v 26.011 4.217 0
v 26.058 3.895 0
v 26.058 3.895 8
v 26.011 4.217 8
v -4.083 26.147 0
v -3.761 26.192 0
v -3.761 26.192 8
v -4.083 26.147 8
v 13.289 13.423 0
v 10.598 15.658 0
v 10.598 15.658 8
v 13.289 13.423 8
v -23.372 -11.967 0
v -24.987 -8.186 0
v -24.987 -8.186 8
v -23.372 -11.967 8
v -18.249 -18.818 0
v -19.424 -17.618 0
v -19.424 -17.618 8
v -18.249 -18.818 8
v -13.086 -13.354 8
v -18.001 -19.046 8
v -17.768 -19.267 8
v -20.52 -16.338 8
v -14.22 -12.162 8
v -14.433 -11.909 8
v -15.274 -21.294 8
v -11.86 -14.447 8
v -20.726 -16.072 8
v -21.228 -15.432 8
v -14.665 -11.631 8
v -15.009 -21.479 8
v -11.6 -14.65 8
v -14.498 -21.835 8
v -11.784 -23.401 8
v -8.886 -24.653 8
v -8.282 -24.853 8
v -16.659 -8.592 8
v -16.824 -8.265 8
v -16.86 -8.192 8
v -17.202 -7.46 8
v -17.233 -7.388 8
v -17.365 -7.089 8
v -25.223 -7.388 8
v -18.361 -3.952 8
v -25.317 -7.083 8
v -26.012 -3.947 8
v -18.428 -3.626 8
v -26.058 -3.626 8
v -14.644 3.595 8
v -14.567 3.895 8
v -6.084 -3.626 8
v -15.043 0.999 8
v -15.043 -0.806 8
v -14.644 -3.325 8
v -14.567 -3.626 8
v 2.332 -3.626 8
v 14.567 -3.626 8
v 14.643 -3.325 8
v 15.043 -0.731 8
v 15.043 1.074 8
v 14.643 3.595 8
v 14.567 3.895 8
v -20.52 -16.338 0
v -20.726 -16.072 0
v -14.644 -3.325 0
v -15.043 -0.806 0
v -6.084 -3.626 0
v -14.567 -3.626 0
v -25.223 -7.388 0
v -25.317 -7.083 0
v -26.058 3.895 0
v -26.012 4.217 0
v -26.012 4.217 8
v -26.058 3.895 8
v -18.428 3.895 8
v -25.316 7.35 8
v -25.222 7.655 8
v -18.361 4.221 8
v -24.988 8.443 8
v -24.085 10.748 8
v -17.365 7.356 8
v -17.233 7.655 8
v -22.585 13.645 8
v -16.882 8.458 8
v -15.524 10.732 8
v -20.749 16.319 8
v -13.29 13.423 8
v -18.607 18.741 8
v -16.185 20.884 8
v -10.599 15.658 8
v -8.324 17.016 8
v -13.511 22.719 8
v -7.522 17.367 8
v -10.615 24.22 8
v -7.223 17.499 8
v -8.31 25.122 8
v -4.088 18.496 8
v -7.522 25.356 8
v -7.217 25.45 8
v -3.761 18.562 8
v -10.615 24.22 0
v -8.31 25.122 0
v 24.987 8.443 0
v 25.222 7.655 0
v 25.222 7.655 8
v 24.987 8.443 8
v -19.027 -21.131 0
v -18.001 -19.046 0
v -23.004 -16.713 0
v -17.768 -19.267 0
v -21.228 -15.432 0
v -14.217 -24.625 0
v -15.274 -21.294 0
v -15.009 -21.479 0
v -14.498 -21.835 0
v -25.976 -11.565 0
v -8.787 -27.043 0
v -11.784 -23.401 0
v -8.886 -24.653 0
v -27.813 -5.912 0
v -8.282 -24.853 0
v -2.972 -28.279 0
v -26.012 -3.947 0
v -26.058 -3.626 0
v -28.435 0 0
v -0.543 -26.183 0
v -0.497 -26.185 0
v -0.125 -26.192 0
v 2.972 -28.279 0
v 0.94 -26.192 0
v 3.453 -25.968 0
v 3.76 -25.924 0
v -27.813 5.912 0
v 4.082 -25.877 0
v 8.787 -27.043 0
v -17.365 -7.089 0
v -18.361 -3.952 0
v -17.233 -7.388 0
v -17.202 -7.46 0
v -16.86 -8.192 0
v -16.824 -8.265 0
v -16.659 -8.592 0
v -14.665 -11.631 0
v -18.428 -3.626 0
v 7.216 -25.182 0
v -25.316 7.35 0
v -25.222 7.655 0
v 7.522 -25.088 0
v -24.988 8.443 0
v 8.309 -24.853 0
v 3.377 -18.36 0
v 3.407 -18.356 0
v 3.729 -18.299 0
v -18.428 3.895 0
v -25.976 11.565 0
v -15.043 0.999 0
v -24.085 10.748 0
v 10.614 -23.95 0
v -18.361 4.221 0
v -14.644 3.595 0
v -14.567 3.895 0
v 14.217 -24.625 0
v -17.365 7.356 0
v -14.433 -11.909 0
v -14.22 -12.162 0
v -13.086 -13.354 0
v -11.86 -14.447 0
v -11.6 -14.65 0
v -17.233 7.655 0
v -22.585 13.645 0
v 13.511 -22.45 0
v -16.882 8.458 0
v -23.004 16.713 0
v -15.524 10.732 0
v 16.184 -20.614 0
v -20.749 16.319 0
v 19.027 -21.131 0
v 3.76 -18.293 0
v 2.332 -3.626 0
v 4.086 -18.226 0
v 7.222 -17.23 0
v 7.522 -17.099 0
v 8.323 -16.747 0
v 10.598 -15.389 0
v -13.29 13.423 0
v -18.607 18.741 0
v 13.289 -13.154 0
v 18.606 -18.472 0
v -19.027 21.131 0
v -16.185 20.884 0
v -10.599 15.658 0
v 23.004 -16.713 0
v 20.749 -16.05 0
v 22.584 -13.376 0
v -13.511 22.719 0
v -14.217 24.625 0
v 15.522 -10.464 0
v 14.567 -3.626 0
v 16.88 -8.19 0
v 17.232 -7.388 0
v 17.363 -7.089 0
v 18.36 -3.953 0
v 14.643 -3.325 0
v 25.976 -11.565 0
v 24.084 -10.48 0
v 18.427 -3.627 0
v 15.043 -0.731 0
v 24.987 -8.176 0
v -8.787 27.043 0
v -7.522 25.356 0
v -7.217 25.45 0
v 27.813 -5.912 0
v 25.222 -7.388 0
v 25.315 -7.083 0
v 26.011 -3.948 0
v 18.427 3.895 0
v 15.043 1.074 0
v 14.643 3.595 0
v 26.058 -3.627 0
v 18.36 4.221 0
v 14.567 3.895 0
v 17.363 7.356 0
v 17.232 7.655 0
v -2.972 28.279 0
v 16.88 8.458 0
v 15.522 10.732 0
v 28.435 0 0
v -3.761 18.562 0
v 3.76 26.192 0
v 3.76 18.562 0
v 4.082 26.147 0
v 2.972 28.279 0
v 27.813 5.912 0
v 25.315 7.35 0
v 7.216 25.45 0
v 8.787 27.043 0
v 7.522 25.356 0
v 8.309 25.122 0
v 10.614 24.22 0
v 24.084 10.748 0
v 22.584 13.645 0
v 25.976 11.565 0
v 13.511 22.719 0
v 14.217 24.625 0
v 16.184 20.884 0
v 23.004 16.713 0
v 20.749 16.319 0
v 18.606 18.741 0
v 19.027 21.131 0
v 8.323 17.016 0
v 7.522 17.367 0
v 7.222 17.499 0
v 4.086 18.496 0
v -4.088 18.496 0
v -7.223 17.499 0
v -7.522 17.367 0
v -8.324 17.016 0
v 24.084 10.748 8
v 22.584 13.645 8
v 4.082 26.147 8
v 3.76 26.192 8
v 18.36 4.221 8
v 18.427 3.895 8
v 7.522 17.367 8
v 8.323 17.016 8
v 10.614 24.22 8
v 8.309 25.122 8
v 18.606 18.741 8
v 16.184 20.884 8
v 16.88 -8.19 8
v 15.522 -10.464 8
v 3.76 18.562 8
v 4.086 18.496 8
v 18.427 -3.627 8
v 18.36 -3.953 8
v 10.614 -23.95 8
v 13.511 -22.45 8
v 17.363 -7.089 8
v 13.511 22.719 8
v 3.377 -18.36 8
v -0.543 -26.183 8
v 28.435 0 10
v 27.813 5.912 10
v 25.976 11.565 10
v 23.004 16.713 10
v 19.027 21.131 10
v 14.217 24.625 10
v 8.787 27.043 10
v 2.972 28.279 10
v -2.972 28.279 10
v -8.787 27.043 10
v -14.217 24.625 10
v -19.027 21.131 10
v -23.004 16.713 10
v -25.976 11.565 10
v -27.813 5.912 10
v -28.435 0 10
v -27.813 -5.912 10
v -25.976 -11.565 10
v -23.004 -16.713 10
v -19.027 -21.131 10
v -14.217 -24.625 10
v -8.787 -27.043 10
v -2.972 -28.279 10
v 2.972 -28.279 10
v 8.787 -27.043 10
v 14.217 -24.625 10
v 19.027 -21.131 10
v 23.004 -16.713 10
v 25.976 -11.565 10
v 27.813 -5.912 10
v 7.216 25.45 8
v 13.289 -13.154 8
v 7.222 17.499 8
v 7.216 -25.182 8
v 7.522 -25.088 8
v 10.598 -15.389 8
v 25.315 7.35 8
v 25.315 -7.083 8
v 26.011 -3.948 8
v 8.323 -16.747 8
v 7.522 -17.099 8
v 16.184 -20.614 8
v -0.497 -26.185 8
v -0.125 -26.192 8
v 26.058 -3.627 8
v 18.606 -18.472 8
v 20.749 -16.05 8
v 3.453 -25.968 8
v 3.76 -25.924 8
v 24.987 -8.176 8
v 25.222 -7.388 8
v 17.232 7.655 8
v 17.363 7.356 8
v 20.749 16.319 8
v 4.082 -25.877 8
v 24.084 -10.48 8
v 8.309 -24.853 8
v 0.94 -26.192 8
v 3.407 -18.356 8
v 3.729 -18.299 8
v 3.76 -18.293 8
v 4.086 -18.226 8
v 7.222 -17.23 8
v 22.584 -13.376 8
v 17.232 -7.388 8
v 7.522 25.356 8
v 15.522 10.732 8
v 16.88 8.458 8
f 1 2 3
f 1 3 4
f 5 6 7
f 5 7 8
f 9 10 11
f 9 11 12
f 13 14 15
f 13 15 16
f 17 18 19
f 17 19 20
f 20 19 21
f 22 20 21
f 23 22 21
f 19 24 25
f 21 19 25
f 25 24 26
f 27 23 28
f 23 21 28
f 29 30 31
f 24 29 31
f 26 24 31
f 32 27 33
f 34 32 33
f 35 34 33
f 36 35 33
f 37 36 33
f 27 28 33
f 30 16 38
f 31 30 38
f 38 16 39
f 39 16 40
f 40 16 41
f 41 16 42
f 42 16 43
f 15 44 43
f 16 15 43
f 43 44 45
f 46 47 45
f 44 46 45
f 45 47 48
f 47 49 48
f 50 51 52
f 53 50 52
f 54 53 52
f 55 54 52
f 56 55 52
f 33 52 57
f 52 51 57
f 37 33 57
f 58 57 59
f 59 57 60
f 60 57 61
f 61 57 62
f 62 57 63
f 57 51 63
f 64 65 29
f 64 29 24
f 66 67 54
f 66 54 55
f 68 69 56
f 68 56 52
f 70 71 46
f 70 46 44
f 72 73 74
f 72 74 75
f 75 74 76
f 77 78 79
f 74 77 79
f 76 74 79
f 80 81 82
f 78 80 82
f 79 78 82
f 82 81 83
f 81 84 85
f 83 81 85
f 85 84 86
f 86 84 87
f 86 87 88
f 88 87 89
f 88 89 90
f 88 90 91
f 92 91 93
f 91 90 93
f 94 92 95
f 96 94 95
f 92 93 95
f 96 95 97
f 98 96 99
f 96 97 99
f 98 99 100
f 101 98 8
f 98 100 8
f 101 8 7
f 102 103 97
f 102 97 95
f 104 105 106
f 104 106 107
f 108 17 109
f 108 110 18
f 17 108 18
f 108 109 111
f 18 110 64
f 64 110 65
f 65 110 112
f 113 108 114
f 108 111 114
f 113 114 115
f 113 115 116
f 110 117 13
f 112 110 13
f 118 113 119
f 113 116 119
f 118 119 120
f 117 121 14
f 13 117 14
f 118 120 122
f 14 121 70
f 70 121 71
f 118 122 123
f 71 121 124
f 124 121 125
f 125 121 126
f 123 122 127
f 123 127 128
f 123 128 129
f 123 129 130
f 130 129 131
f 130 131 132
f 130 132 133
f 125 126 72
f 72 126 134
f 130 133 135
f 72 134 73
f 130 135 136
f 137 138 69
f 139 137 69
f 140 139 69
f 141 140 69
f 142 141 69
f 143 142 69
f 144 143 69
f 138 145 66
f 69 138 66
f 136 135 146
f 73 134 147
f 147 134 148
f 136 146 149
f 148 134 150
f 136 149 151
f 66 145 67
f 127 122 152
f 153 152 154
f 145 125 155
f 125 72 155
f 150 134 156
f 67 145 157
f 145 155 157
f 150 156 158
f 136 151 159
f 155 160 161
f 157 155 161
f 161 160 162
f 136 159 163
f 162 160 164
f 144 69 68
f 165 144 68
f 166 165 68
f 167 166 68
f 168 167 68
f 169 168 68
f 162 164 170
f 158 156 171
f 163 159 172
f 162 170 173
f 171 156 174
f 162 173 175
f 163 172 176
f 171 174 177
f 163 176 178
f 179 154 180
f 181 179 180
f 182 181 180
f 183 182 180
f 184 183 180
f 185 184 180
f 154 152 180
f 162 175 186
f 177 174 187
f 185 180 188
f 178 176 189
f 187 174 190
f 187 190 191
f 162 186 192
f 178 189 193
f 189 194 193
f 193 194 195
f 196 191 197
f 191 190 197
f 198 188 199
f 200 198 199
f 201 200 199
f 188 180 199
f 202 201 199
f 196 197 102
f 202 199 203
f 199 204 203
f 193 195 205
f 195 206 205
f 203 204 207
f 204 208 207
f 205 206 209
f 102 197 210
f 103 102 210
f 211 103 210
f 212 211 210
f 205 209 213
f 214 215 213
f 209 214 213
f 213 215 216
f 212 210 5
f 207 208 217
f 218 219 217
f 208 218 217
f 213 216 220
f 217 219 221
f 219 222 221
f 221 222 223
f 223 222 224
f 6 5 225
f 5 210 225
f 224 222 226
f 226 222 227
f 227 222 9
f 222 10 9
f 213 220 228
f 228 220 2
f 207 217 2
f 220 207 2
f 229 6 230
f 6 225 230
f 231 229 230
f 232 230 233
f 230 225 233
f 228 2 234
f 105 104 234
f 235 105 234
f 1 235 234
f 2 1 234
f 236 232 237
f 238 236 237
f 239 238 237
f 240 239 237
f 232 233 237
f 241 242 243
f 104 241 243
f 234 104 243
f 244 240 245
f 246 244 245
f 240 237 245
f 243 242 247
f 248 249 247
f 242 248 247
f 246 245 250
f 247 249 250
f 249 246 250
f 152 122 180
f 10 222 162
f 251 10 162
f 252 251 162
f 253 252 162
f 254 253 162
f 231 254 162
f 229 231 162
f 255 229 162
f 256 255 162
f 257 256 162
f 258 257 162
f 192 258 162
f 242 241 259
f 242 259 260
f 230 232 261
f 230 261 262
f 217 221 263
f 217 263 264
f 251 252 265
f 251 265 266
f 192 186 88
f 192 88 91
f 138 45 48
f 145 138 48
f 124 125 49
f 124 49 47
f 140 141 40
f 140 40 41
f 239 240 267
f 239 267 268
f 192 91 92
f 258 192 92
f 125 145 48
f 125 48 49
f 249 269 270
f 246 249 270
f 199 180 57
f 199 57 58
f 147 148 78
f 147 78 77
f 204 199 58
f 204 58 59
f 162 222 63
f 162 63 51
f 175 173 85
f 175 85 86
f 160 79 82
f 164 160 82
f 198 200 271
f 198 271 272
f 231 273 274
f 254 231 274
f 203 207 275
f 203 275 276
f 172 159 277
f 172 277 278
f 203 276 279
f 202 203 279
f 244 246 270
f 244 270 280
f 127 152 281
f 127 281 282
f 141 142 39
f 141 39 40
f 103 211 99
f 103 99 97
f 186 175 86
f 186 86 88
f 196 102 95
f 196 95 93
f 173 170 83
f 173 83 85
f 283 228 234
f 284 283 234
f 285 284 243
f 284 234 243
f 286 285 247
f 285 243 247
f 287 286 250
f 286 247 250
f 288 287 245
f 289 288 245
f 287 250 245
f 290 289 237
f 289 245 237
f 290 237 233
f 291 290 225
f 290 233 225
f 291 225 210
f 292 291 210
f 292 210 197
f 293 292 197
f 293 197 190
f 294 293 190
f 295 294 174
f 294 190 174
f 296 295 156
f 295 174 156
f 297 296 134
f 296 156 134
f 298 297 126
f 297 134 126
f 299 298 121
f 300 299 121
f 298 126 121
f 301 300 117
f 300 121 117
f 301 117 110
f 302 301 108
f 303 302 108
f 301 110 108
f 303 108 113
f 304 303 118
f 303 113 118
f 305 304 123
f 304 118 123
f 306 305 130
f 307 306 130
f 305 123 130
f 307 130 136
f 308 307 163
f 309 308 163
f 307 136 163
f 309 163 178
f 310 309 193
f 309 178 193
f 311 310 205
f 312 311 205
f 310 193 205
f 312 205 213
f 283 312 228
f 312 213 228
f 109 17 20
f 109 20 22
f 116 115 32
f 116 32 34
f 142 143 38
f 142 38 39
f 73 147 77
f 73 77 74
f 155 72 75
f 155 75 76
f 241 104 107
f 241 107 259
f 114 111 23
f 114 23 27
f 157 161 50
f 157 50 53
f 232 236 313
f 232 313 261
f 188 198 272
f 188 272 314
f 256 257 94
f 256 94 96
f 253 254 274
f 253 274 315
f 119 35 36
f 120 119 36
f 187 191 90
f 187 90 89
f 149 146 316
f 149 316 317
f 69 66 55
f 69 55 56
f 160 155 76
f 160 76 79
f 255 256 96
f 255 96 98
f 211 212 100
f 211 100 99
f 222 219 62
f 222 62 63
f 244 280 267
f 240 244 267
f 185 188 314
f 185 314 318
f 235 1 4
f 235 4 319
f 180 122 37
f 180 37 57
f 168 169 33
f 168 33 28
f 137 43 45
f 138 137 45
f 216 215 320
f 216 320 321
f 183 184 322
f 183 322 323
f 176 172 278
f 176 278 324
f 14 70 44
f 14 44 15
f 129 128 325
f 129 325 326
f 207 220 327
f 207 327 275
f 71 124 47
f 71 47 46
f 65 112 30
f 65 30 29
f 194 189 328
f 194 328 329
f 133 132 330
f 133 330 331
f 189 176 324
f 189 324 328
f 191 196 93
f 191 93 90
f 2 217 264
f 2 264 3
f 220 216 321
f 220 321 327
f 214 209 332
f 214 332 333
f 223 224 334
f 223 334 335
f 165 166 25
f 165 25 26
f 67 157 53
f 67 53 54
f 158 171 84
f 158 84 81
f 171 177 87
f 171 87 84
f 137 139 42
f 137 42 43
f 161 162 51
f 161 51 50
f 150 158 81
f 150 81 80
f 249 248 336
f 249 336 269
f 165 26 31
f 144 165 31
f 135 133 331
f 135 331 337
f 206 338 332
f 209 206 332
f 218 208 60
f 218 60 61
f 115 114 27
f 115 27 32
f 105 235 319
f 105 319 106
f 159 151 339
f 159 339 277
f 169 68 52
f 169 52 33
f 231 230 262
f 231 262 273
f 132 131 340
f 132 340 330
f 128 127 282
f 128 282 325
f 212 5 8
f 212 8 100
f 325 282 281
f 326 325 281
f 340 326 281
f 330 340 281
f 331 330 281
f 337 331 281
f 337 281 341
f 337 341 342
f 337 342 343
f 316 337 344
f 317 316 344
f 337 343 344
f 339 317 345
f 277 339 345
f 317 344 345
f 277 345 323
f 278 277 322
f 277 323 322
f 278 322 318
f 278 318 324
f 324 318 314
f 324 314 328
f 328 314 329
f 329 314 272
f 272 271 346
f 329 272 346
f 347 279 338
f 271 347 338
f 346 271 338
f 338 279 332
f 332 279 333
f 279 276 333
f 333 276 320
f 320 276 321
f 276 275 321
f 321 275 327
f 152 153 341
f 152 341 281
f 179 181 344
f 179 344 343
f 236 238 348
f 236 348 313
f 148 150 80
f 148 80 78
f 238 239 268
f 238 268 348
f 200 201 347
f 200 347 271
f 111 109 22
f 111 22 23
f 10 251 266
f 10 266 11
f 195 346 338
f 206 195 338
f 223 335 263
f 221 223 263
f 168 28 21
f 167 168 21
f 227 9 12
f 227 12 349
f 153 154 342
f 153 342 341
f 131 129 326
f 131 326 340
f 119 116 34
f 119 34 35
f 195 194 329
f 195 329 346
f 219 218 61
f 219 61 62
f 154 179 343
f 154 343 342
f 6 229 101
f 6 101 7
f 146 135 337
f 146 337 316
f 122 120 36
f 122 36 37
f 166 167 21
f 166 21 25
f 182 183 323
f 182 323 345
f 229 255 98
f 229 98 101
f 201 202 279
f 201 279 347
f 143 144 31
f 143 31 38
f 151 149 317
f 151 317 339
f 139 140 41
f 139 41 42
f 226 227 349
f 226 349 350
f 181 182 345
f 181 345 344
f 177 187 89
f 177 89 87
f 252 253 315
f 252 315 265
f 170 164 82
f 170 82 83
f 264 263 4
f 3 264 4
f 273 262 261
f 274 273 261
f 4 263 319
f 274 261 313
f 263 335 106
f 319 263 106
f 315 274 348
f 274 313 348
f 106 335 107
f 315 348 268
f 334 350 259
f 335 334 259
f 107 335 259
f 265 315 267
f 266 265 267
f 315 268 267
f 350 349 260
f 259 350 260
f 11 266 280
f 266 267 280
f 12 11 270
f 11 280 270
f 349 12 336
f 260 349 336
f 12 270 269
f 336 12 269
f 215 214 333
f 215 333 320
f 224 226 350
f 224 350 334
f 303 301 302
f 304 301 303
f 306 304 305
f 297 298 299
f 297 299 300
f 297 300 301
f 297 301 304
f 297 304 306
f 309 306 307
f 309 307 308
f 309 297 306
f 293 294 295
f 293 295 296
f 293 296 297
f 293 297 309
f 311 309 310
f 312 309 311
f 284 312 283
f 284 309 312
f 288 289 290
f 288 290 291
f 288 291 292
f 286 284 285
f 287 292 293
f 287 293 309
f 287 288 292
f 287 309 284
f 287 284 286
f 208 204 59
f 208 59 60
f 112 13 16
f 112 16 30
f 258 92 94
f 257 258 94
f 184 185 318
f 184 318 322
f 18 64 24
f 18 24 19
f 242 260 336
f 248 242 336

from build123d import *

# Parameters (mm, degrees)
F1_R     = 28.434676
F2_DEPTH = 10
F3_DEPTH = 8


with BuildPart() as f2:
    # F1 (on Top) → F2 (new body)
    with BuildSketch(Plane.XY):
        Circle(F1_R)
    extrude(amount=F2_DEPTH)

    # F0 (on Top) → F3 (cut)
    with BuildSketch(Plane.XY):
        Polygon((-17.364958, 7.356322), (-17.232909, 7.654685), (-16.881704, 8.45762), (-15.524421, 10.731926), (-13.289539, 13.42287), (-10.598709, 15.657751), (-8.324306, 17.015878), (-7.521533, 17.367132), (-7.223008, 17.499197), (-4.087684, 18.495686), (-3.761253, 18.562368), (-3.761253, 26.192278), (-4.083303, 26.146526), (-7.216843, 25.450184), (-7.521533, 25.355921), (-8.310191, 25.121806), (-10.614544, 24.219579), (-13.511356, 22.718842), (-16.184583, 20.883562), (-18.606935, 18.740996), (-20.749388, 16.318725), (-22.584635, 13.645466), (-24.085421, 10.747988), (-24.987648, 8.443342), (-25.22178, 7.654685), (-25.315961, 7.350319), (-26.012222, 4.216617), (-26.05799, 3.894567), (-18.428258, 3.894567), (-18.36135, 4.220998), align=None)
        Polygon((16.879968, 8.45762), (17.232033, 7.654685), (17.363124, 7.356322), (18.360425, 4.220998), (18.427431, 3.894567), (26.05799, 3.894567), (26.011265, 4.216617), (25.314923, 7.350319), (25.221634, 7.654685), (24.986707, 8.443342), (24.08448, 10.747988), (22.583743, 13.645466), (20.748625, 16.318725), (18.606059, 18.740996), (16.183626, 20.883562), (13.510529, 22.718842), (10.613701, 24.219579), (8.309379, 25.121806), (7.521533, 25.355921), (7.216031, 25.450184), (4.081519, 26.146526), (3.76028, 26.192278), (3.76028, 18.562368), (4.085899, 18.495686), (7.222034, 17.499197), (7.521533, 17.367132), (8.323332, 17.015878), (10.597801, 15.657751), (13.288582, 13.42287), (15.52249, 10.731926), align=None)
        Polygon((-8.28196, -24.853474), (2.331578, -3.625992), (14.566724, -3.625992), (14.643302, -3.325033), (15.042903, -0.731111), (15.042903, 0.133314), (15.042903, 1.074317), (14.643302, 3.595231), (14.566724, 3.895378), (-14.56674, 3.895378), (-14.64421, 3.595231), (-15.042936, 0.999361), (-15.042936, 0.133314), (-15.042936, -0.805904), (-14.64421, -3.325033), (-14.56674, -3.625992), (-6.08407, -3.625992), (-11.600391, -14.64997), (-11.860075, -14.446648), (-13.086218, -13.35429), (-14.219915, -12.161601), (-14.432955, -11.908975), (-14.665318, -11.630827), (-16.659027, -8.592378), (-16.823605, -8.264811), (-16.859704, -8.191803), (-17.202116, -7.460416), (-17.232909, -7.388219), (-17.364958, -7.088882), (-18.36135, -3.951774), (-18.428258, -3.625992), (-26.05799, -3.625992), (-26.012222, -3.947393), (-25.316853, -7.082717), (-25.222672, -7.388219), (-24.986756, -8.185637), (-23.372433, -11.967073), (-21.228228, -15.431619), (-20.726496, -16.071517), (-20.519653, -16.338226), (-19.423791, -17.618071), (-18.248689, -18.817801), (-18.001351, -19.0458), (-17.76808, -19.266724), (-15.273546, -21.293855), (-15.009482, -21.478697), (-14.498079, -21.835208), (-11.784357, -23.401118), (-8.885825, -24.652781), align=None)
        Polygon((17.363124, -7.088882), (17.232033, -7.388219), (16.879968, -8.190018), (15.52249, -10.463659), (13.288582, -13.154473), (10.597801, -15.389355), (8.323332, -16.746654), (7.521533, -17.098735), (7.222034, -17.229908), (4.085899, -18.2263), (3.76028, -18.293192), (3.728643, -18.299373), (3.407404, -18.355704), (3.376578, -18.360101), (-0.543186, -26.183484), (-0.497271, -26.185237), (-0.124926, -26.192278), (0, -26.192278), (0.940192, -26.192278), (3.453156, -25.967833), (3.76028, -25.923816), (4.081519, -25.877156), (7.216031, -25.181787), (7.521533, -25.087606), (8.309379, -24.852582), (10.613701, -23.950371), (13.510529, -22.449585), (16.183626, -20.614338), (18.606059, -18.471885), (20.748625, -16.049533), (22.583743, -13.376306), (24.08448, -10.48037), (24.986707, -8.175903), (25.221634, -7.388219), (25.314923, -7.082717), (26.011265, -3.948367), (26.05799, -3.626966), (18.427431, -3.626966), (18.360425, -3.952747), align=None)
    extrude(amount=F3_DEPTH, mode=Mode.SUBTRACT)


solid = f2.part
